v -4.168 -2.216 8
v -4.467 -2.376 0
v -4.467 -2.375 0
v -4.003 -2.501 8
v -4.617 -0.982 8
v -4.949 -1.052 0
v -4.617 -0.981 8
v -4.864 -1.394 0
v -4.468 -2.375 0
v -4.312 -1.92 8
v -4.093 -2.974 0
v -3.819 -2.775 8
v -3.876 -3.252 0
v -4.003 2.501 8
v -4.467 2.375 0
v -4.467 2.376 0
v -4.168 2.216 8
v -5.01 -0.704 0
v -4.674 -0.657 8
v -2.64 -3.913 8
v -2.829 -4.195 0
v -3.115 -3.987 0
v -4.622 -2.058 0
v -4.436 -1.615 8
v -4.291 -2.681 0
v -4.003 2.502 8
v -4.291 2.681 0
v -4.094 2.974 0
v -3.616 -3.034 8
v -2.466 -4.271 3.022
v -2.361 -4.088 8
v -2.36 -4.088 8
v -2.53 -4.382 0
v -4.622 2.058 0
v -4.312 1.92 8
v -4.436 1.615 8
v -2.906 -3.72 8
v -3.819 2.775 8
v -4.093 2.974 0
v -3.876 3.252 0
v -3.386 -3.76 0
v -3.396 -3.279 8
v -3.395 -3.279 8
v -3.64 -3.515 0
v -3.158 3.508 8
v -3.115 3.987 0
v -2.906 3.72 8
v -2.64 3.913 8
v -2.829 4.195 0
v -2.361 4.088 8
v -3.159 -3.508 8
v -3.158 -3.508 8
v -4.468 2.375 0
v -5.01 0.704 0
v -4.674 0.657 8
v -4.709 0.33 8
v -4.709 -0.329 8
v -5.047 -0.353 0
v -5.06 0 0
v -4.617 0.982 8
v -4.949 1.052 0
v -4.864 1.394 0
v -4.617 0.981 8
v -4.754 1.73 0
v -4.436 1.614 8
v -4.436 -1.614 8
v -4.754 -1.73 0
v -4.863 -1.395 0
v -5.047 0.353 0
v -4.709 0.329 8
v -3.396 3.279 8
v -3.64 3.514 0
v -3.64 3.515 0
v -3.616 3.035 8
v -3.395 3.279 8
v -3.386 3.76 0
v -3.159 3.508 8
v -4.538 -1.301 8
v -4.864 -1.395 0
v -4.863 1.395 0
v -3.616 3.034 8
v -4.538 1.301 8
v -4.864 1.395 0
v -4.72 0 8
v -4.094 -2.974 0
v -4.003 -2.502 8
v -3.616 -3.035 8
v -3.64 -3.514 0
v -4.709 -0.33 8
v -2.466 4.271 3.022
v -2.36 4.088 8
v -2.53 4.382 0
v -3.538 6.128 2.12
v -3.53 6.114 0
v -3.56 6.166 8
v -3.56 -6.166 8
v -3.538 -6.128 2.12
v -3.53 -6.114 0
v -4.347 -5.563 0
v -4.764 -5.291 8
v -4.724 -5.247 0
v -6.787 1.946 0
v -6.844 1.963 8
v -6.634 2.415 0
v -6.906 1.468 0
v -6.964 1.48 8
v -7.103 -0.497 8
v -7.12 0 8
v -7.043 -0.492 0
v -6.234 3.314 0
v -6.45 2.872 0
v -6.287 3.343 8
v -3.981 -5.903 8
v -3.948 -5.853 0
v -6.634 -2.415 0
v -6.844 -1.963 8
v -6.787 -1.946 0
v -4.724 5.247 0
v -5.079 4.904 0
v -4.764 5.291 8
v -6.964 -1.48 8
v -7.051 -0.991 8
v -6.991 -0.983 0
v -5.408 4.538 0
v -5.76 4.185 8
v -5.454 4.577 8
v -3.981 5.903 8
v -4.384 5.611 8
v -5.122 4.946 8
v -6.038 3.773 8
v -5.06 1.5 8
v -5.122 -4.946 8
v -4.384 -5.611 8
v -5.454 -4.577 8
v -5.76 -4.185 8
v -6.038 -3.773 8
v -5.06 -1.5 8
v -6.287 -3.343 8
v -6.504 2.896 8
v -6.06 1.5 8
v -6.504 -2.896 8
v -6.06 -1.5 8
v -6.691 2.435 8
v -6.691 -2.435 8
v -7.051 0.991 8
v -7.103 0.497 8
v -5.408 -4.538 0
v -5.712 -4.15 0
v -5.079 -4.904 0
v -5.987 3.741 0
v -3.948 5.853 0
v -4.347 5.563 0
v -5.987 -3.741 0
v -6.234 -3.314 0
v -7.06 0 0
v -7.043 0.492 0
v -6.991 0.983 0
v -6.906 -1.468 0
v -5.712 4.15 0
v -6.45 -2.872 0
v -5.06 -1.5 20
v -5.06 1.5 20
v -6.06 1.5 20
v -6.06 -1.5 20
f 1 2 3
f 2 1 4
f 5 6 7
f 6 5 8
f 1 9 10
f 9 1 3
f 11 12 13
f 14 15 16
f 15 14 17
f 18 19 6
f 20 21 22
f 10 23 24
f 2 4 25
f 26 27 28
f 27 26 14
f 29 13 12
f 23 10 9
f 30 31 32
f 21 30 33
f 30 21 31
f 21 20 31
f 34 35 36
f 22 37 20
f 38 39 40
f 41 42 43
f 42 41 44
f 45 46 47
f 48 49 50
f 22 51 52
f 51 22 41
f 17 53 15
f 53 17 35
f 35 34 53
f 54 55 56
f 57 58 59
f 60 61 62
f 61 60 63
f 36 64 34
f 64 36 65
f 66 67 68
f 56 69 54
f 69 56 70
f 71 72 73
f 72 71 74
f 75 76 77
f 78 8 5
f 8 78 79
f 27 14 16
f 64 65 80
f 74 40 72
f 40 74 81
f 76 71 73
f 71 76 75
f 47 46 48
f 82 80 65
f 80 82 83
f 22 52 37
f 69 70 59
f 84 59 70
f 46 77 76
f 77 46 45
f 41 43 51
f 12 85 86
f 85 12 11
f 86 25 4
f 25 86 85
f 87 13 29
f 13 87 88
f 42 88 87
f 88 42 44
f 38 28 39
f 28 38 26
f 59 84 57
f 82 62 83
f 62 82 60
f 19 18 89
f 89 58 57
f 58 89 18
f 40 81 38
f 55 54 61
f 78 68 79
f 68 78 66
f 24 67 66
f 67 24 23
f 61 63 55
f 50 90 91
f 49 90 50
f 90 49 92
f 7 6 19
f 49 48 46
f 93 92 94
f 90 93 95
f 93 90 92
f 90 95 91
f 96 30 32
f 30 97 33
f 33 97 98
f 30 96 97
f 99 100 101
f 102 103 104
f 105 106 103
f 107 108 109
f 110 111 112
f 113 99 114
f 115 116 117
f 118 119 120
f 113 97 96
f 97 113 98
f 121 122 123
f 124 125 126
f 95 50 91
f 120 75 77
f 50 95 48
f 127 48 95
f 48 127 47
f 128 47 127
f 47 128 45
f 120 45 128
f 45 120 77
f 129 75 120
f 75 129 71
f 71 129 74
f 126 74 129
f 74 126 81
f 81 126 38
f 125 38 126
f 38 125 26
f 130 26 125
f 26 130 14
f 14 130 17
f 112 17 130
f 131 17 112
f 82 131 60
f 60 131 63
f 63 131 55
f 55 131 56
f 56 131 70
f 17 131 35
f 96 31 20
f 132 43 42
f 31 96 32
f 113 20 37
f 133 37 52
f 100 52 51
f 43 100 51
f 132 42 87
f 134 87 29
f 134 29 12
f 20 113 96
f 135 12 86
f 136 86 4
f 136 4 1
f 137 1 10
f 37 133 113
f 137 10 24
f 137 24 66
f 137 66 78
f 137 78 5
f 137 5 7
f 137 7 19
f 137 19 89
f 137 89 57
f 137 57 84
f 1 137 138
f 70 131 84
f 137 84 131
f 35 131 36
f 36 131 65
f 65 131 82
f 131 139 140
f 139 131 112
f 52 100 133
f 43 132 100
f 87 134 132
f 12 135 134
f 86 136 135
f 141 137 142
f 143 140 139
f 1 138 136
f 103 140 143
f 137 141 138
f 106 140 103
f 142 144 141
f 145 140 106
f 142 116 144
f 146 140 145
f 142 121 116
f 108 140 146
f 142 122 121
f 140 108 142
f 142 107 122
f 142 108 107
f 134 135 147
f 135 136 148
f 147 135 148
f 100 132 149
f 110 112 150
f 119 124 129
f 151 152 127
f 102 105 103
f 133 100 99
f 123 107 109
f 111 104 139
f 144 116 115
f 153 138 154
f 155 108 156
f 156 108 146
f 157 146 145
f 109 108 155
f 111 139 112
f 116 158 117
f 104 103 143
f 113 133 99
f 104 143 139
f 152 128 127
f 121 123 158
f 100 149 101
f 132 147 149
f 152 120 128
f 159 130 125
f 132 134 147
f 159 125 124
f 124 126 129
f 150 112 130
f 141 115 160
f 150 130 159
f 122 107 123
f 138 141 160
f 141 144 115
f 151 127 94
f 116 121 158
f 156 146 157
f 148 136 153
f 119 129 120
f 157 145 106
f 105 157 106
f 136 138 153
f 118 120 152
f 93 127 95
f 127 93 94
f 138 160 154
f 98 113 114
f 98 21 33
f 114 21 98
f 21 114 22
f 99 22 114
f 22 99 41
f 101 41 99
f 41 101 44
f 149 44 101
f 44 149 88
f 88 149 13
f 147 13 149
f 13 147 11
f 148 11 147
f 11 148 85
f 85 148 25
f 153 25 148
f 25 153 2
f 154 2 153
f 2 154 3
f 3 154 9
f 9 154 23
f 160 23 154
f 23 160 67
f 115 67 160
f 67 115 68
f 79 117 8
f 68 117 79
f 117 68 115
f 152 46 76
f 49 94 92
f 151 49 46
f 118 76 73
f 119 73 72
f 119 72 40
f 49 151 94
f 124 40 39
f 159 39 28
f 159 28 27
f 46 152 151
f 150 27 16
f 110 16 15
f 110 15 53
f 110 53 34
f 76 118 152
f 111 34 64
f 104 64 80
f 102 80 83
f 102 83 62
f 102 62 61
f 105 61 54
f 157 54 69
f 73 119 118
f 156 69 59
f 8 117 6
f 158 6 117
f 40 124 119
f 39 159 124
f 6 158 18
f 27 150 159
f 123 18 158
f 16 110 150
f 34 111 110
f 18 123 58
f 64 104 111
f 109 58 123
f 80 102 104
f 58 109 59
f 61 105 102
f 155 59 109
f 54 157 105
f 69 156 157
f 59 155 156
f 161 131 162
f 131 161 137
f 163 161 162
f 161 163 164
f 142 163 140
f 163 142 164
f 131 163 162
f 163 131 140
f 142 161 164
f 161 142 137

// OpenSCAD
$fn=90;
// height
h=8;
// outside rad top
ort=14.24/2;
// outside rad bottom
orb=14.12/2;
// inside rad top
irt=ort-2.4;
// inside rad bottom
irb=orb-2.0;

difference() {
    cylinder(h, orb,  ort);
    translate([0, 0, -0.01]) {
        cylinder(h+0.02, irb,  irt);
        rotate([0, 0, 30]) cube(99);
        rotate([0, 0, -50]) cube(99);
        rotate([0, 0, -120]) cube(99);
    }
}

translate([-irb-1, -1.5, 0]) cube([1, 3, 20]);

echo(h);
